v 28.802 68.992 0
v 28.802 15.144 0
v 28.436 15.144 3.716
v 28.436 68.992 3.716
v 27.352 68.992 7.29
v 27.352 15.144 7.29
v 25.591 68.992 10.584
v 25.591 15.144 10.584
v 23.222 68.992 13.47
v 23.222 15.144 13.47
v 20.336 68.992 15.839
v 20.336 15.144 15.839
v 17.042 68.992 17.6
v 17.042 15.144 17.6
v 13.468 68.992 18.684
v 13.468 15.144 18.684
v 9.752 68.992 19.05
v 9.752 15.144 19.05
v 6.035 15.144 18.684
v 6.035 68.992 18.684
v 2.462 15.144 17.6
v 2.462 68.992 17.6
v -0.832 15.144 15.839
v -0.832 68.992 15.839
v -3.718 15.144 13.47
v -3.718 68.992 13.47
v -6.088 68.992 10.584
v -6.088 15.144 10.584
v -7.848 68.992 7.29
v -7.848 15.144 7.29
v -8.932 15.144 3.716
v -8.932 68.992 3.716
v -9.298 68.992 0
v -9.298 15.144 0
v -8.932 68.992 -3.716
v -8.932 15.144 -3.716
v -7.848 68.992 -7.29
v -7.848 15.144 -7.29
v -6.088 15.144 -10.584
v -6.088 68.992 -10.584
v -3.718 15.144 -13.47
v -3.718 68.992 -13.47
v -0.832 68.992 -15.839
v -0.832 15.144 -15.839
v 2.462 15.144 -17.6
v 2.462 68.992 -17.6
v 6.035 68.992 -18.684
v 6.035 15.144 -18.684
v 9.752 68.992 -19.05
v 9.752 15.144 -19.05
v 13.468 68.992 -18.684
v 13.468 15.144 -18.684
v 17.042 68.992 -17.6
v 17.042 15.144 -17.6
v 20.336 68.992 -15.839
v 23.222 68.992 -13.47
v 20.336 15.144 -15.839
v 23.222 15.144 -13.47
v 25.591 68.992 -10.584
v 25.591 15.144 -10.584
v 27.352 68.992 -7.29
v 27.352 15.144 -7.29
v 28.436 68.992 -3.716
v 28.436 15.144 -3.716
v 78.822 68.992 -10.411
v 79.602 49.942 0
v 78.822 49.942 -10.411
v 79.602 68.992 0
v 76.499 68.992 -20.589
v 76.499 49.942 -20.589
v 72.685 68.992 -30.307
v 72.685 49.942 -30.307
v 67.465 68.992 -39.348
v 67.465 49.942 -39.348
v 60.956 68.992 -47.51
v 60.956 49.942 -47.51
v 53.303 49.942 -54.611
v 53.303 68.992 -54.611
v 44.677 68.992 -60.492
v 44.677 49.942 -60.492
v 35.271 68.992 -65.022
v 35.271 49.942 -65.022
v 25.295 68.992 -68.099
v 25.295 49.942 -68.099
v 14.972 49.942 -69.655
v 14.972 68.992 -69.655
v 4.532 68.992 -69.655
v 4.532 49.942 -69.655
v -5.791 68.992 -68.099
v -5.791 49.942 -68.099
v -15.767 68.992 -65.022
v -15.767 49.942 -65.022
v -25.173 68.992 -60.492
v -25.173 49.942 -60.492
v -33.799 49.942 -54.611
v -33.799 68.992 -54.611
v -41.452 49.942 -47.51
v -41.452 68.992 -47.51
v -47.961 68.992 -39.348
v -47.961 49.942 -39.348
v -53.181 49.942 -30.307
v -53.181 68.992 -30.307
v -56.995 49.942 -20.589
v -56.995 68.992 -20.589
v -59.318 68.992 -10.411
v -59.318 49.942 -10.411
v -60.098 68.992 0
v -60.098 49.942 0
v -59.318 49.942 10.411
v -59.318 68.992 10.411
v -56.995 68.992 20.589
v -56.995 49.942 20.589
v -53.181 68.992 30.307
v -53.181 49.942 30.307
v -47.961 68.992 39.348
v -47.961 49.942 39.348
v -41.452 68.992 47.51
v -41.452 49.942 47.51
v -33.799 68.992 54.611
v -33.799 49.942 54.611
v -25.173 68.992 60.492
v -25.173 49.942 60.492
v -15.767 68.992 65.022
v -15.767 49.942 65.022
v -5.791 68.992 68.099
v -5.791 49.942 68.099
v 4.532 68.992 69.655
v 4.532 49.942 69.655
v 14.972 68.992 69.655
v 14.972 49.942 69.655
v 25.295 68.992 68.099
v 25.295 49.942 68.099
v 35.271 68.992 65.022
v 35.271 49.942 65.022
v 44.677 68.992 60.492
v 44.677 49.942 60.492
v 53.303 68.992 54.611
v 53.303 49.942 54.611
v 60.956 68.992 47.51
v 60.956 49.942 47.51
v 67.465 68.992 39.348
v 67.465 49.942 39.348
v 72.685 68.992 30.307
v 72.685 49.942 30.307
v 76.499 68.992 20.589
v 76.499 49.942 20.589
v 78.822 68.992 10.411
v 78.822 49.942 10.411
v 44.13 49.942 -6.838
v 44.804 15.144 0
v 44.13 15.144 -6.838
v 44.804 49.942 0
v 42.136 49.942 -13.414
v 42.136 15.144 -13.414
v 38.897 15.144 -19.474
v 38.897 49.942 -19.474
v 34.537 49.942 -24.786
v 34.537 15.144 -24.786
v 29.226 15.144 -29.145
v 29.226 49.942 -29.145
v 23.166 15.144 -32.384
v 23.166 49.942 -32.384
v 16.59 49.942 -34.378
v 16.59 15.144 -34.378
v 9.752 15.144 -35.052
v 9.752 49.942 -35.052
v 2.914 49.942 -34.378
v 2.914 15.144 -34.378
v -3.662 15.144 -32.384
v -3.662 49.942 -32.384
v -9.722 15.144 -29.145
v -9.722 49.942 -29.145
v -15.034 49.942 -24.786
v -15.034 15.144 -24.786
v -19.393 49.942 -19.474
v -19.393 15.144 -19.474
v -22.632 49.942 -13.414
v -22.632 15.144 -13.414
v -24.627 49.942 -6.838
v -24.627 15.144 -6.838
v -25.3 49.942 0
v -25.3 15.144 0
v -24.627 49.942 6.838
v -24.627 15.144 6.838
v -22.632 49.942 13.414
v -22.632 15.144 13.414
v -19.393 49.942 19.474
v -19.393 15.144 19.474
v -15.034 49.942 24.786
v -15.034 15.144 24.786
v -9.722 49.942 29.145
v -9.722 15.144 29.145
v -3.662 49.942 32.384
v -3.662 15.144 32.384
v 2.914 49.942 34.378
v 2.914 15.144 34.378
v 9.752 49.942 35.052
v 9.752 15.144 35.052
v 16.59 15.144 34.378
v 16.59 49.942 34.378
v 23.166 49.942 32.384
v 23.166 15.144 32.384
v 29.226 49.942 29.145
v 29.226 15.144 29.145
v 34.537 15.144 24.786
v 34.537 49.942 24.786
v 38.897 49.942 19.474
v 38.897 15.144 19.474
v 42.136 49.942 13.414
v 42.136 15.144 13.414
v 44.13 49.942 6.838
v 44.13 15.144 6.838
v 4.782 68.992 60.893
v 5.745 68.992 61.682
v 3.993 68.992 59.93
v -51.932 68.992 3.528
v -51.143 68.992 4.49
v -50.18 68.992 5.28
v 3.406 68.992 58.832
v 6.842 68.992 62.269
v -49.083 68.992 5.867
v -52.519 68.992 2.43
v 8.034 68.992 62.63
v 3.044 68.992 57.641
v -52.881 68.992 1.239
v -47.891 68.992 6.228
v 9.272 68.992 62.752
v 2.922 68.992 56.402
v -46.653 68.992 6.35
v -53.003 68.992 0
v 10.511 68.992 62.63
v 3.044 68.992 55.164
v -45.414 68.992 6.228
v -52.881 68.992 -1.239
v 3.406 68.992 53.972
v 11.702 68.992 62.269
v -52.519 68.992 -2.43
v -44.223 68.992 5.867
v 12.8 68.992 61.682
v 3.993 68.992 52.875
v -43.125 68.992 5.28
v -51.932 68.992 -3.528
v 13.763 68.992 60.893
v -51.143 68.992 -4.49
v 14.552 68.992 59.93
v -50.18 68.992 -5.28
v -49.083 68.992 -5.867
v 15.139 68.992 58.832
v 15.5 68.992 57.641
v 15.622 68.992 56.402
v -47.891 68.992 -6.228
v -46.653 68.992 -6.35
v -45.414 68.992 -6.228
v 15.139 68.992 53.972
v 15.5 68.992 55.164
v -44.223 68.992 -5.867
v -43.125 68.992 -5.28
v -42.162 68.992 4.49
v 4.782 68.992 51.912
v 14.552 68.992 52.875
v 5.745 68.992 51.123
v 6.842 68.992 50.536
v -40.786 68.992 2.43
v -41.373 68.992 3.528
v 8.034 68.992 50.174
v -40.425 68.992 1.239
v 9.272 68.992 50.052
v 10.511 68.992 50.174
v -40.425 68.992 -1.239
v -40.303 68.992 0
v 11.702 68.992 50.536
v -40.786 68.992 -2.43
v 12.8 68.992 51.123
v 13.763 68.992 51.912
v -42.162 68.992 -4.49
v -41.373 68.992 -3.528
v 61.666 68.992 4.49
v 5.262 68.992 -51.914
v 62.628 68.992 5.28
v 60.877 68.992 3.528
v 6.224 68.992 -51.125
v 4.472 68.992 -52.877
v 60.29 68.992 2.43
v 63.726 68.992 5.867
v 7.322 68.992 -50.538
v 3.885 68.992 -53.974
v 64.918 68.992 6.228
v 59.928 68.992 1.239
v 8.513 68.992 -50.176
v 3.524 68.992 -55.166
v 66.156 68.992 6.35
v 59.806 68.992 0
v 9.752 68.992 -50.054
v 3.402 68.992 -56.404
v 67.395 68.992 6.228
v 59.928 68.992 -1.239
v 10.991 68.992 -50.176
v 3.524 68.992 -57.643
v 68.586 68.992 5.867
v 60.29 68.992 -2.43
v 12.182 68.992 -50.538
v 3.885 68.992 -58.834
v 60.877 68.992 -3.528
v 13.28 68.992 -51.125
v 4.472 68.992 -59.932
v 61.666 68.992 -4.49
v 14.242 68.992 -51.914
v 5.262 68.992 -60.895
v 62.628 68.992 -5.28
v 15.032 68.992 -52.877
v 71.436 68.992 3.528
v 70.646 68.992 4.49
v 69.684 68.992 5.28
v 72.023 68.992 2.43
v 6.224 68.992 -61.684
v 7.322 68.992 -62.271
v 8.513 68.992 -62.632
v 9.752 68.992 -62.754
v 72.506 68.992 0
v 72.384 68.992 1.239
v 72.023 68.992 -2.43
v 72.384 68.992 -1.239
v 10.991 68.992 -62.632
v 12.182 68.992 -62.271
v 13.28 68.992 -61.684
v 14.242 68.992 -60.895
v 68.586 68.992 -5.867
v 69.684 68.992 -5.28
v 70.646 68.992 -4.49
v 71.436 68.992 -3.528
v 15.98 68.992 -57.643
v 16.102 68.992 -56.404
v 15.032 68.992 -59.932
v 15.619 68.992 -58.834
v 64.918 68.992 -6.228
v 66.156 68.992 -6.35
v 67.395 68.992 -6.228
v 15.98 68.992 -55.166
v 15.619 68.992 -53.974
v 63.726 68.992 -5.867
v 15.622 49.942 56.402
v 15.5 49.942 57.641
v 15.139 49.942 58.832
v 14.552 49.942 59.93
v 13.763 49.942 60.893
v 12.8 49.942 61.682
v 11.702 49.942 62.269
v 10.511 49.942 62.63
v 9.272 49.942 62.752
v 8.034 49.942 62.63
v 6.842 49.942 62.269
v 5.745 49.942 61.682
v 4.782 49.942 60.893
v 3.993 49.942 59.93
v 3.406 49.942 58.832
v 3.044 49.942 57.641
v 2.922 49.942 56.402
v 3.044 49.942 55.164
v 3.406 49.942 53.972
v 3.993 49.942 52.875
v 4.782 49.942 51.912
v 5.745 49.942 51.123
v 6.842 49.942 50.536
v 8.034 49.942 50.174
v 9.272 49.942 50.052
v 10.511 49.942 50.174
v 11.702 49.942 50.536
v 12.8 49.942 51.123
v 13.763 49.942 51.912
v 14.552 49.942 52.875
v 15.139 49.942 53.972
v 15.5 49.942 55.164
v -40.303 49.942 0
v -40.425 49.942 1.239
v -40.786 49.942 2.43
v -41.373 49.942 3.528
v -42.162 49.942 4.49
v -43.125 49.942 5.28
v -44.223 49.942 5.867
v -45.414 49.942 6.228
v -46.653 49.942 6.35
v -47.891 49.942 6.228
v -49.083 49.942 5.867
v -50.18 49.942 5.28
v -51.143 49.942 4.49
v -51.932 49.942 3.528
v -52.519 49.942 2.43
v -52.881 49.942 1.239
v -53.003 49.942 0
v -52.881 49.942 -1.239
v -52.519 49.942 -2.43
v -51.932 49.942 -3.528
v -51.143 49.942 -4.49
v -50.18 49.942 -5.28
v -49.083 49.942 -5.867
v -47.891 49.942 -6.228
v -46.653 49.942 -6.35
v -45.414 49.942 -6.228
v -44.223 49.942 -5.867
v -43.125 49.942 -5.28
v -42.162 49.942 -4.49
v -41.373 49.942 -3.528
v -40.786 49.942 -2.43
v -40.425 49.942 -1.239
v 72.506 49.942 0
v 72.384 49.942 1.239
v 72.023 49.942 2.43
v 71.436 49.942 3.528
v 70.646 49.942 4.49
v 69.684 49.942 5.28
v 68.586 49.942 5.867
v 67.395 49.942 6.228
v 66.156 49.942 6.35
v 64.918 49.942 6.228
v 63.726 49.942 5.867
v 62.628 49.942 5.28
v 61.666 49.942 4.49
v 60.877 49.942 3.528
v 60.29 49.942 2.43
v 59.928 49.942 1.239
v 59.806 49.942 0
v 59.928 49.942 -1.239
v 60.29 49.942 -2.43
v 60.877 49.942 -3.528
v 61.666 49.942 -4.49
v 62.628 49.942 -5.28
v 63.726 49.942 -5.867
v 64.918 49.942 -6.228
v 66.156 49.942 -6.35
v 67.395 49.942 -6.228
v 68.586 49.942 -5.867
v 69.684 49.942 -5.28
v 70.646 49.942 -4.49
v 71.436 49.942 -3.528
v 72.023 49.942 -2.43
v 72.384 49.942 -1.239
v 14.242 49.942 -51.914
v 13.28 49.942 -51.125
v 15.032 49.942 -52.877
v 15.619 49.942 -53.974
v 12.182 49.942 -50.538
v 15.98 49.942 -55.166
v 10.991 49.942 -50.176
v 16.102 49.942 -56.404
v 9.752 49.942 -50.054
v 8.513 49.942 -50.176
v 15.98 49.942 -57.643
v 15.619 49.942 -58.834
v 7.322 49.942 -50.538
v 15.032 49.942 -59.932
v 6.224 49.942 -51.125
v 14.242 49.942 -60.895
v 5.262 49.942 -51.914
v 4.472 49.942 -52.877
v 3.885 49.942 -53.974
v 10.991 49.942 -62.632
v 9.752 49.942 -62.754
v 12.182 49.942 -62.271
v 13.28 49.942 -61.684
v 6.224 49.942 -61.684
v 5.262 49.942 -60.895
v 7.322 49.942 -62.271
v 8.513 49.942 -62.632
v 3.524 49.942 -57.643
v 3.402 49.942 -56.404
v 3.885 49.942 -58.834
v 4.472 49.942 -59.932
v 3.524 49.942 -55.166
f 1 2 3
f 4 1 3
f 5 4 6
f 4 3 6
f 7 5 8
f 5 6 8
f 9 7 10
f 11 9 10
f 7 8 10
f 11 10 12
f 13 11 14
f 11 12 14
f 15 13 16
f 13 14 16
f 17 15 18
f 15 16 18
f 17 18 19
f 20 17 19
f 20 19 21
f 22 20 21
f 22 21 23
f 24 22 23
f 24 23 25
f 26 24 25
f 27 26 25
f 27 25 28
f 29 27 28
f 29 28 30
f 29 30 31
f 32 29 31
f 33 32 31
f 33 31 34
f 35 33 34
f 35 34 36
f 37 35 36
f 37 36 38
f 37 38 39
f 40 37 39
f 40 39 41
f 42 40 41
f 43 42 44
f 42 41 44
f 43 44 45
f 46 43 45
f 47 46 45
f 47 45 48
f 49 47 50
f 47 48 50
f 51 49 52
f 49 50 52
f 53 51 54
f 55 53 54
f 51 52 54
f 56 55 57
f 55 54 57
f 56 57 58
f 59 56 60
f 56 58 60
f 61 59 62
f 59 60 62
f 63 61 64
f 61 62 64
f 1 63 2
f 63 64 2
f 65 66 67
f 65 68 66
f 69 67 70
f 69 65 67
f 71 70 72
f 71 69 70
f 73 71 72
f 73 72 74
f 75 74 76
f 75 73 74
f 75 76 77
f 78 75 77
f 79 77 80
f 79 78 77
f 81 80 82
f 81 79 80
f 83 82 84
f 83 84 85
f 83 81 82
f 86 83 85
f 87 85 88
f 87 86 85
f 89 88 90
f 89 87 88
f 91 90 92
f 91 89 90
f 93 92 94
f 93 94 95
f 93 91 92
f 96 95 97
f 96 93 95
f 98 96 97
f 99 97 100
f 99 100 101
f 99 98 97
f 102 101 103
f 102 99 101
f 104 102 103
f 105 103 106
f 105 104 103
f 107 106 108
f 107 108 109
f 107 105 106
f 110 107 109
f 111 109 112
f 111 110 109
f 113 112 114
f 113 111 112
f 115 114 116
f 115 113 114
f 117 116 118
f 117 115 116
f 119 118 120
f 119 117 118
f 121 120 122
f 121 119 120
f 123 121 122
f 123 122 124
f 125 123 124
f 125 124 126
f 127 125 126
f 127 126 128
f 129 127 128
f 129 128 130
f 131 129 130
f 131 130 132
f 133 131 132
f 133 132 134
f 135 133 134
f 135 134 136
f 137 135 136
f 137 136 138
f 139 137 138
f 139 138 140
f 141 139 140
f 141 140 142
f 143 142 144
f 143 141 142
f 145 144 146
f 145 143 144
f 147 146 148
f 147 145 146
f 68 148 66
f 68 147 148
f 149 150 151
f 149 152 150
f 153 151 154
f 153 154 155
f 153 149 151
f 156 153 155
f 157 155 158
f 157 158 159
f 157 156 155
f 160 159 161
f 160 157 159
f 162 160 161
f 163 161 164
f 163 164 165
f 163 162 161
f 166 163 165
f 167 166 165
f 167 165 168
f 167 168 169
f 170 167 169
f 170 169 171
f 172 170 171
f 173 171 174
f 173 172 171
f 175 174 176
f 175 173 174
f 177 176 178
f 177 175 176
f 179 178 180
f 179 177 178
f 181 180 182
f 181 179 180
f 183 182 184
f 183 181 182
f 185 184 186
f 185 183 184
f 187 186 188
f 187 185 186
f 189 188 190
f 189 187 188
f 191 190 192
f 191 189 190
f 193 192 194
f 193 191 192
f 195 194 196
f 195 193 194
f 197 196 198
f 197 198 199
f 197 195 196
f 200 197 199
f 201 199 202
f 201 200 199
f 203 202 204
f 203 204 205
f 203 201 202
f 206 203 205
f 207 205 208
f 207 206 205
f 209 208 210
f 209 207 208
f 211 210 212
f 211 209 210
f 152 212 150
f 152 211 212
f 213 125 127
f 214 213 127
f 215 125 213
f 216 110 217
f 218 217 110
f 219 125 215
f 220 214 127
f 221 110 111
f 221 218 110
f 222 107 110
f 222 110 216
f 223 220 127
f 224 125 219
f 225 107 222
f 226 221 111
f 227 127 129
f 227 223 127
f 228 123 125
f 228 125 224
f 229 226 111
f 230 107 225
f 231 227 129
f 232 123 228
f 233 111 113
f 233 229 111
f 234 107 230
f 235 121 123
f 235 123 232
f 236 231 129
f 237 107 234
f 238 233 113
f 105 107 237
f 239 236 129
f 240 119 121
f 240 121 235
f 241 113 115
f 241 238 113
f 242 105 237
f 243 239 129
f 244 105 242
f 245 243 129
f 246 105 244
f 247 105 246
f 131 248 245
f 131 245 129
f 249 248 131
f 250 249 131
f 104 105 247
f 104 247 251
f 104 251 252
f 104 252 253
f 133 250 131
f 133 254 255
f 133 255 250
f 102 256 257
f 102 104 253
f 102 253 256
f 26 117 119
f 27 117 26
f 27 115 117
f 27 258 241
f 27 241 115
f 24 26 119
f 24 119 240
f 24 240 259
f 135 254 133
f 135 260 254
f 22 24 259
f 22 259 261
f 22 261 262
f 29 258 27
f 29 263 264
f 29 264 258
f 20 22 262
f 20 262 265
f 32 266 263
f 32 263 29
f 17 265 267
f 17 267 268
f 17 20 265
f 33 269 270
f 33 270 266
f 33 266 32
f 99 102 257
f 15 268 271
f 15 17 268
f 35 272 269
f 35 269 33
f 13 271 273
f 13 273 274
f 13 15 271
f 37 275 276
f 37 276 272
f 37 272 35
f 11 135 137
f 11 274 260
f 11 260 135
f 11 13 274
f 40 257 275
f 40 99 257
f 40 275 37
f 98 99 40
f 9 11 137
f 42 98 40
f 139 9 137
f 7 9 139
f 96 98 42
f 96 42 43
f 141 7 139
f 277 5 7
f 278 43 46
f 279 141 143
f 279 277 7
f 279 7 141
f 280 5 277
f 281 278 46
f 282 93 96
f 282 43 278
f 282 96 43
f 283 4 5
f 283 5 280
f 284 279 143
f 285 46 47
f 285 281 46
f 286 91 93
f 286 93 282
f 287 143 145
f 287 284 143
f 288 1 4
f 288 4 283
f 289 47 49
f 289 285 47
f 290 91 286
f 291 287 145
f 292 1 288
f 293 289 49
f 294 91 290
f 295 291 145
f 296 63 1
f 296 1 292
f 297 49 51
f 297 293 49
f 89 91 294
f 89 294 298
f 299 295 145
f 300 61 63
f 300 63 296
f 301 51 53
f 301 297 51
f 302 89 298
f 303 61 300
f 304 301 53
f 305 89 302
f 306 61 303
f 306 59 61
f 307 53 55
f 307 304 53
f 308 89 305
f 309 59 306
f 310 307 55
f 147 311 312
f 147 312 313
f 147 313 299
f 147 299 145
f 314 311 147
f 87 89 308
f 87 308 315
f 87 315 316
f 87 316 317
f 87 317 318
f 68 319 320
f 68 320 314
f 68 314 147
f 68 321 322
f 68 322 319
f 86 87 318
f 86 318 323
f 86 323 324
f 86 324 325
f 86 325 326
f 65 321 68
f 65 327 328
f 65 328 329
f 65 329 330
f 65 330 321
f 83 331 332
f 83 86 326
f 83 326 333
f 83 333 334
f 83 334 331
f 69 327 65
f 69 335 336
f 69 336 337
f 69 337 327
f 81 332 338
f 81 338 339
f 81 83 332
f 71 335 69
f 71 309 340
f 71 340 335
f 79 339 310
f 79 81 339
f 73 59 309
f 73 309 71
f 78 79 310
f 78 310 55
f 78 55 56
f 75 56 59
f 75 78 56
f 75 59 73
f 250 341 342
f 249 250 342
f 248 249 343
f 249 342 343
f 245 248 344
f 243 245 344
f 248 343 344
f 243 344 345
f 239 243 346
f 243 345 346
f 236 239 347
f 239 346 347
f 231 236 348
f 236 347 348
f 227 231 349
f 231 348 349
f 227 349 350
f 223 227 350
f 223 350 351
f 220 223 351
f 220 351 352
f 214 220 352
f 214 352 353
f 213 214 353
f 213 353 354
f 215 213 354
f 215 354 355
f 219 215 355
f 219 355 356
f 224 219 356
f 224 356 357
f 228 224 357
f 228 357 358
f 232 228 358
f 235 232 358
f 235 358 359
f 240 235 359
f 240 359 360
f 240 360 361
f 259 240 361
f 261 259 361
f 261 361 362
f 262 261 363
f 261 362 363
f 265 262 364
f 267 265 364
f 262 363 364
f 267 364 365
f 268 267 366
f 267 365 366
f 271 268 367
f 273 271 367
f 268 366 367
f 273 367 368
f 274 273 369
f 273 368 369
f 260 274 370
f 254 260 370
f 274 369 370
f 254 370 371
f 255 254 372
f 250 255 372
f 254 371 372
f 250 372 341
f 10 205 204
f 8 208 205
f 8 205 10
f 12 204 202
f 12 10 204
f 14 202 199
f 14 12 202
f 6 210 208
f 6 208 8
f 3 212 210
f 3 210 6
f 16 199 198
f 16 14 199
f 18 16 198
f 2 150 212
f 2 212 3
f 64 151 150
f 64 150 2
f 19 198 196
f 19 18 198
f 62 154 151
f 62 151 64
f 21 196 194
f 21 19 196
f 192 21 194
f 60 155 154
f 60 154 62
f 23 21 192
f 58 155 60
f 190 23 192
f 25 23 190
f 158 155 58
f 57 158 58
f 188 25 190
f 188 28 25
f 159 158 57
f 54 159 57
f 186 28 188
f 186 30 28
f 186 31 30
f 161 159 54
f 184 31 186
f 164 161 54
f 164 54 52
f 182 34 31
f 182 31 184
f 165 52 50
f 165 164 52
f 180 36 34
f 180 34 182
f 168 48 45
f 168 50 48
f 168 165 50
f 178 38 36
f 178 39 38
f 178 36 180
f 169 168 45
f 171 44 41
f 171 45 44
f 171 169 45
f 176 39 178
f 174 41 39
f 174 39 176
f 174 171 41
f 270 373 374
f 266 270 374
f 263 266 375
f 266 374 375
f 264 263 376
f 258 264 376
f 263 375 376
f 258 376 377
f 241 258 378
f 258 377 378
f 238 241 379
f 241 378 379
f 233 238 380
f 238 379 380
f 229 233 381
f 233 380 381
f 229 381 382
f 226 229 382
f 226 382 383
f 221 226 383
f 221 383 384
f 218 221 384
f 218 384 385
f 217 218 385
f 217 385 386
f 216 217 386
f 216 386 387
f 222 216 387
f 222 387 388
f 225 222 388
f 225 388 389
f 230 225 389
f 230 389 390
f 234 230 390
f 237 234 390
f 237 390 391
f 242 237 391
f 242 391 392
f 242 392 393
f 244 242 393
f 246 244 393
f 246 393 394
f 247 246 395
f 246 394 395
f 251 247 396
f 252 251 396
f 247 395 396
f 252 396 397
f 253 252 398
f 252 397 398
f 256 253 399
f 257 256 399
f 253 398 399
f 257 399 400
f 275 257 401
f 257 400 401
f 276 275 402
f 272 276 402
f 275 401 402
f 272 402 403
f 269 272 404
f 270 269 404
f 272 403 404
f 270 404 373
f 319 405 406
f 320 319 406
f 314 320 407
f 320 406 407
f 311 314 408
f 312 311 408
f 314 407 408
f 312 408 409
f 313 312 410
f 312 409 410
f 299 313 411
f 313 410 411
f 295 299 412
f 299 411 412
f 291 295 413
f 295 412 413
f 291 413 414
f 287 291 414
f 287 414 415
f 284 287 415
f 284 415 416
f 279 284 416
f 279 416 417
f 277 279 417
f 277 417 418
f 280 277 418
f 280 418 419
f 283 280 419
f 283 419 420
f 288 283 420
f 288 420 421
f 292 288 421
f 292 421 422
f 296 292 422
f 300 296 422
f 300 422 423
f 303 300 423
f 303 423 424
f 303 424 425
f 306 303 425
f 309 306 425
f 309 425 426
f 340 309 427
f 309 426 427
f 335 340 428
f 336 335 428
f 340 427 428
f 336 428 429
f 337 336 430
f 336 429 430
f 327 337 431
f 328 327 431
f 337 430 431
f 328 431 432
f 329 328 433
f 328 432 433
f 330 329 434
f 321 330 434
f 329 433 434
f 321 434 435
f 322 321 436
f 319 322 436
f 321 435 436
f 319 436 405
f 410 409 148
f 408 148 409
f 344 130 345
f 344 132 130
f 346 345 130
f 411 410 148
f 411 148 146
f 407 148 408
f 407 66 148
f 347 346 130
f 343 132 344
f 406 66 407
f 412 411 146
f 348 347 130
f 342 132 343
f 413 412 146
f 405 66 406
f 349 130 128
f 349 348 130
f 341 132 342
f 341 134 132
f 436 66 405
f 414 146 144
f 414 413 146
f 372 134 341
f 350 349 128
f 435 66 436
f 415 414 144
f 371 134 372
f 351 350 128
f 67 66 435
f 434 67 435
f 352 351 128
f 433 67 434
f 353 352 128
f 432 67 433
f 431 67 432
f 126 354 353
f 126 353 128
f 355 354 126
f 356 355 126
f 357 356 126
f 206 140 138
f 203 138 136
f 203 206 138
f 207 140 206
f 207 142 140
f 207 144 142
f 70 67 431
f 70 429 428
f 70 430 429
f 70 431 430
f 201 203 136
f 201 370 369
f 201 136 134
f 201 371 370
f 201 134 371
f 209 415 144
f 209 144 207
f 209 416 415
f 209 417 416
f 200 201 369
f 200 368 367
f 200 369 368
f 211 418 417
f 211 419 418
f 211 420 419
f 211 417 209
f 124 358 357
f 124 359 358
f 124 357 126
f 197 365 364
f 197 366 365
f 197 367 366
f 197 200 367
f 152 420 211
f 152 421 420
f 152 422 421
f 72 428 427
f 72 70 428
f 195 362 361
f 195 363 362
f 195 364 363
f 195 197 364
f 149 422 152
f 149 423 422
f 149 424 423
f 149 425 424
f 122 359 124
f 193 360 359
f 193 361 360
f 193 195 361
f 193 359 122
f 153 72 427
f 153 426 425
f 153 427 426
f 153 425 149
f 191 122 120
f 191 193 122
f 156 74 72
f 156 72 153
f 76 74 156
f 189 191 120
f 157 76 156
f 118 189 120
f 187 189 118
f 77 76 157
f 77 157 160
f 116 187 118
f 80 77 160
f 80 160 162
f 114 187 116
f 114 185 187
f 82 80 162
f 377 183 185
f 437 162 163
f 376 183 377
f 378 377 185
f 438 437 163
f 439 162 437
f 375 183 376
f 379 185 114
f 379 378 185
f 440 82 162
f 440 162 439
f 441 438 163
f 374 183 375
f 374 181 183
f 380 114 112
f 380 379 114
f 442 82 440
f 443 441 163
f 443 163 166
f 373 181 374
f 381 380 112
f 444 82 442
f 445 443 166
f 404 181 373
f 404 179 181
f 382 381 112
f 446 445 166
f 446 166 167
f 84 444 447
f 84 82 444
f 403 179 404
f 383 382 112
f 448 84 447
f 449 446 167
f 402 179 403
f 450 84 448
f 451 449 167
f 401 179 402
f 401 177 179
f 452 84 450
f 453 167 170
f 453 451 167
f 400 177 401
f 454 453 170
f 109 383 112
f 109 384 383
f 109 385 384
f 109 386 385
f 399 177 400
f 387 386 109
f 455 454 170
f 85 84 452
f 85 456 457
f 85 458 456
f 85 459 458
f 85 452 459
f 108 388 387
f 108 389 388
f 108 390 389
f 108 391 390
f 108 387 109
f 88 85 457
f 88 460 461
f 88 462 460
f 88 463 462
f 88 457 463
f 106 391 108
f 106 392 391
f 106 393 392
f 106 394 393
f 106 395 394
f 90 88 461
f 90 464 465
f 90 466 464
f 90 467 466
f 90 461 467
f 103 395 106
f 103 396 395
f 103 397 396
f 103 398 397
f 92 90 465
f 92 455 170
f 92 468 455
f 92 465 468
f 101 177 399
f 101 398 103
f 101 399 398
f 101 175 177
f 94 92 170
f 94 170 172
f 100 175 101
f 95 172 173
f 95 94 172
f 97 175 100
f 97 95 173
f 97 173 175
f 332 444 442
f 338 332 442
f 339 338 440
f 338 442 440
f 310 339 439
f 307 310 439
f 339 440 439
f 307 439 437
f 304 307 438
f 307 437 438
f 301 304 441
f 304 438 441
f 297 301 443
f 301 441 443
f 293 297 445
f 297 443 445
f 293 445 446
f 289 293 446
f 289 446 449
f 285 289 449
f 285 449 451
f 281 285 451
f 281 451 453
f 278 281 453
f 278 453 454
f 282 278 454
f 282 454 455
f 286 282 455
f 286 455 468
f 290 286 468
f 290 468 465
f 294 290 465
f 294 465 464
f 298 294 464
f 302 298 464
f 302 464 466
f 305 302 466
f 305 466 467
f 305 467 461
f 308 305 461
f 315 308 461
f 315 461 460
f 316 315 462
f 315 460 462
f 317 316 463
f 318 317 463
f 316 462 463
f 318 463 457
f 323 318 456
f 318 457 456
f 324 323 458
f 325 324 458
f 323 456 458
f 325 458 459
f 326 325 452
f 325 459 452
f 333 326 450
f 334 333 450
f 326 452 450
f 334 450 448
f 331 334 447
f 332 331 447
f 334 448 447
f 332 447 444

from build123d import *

# Parameters (mm, degrees)
F2_R     = 19.05
F3_DEPTH = 108.966
F4_R     = 6.35
F5_DEPTH = 115.316


with BuildPart() as f1:
    # F0 (on Top) → F1 (revolve)
    with BuildSketch(Plane.XY):
        Polygon((9.751909, 68.992269), (9.751909, 15.144269), (44.803909, 15.144269), (44.803909, 49.942269), (79.601909, 49.942269), (79.601909, 68.992269), align=None)
    revolve(axis=Axis((9.751909, 42.068269, 0), (0, 1, 0)))

    # F2 (on face) → F3 (cut)
    with BuildSketch(Plane.XZ.offset(-15.144269)):
        with Locations((9.751909, 0)):
            Circle(F2_R)
    extrude(amount=-F3_DEPTH, mode=Mode.SUBTRACT)

    # F4 (on face) → F5 (cut)
    with BuildSketch(Plane.XZ.offset(-49.942269)):
        with Locations((9.272376, 56.402412)):
            Circle(F4_R)
        with Locations((66.156359, 0)):
            Circle(F4_R)
        with Locations((-46.652542, 0)):
            Circle(F4_R)
        with Locations((9.751909, -56.404451)):
            Circle(F4_R)
    extrude(amount=-F5_DEPTH, mode=Mode.SUBTRACT)


solid = f1.part
